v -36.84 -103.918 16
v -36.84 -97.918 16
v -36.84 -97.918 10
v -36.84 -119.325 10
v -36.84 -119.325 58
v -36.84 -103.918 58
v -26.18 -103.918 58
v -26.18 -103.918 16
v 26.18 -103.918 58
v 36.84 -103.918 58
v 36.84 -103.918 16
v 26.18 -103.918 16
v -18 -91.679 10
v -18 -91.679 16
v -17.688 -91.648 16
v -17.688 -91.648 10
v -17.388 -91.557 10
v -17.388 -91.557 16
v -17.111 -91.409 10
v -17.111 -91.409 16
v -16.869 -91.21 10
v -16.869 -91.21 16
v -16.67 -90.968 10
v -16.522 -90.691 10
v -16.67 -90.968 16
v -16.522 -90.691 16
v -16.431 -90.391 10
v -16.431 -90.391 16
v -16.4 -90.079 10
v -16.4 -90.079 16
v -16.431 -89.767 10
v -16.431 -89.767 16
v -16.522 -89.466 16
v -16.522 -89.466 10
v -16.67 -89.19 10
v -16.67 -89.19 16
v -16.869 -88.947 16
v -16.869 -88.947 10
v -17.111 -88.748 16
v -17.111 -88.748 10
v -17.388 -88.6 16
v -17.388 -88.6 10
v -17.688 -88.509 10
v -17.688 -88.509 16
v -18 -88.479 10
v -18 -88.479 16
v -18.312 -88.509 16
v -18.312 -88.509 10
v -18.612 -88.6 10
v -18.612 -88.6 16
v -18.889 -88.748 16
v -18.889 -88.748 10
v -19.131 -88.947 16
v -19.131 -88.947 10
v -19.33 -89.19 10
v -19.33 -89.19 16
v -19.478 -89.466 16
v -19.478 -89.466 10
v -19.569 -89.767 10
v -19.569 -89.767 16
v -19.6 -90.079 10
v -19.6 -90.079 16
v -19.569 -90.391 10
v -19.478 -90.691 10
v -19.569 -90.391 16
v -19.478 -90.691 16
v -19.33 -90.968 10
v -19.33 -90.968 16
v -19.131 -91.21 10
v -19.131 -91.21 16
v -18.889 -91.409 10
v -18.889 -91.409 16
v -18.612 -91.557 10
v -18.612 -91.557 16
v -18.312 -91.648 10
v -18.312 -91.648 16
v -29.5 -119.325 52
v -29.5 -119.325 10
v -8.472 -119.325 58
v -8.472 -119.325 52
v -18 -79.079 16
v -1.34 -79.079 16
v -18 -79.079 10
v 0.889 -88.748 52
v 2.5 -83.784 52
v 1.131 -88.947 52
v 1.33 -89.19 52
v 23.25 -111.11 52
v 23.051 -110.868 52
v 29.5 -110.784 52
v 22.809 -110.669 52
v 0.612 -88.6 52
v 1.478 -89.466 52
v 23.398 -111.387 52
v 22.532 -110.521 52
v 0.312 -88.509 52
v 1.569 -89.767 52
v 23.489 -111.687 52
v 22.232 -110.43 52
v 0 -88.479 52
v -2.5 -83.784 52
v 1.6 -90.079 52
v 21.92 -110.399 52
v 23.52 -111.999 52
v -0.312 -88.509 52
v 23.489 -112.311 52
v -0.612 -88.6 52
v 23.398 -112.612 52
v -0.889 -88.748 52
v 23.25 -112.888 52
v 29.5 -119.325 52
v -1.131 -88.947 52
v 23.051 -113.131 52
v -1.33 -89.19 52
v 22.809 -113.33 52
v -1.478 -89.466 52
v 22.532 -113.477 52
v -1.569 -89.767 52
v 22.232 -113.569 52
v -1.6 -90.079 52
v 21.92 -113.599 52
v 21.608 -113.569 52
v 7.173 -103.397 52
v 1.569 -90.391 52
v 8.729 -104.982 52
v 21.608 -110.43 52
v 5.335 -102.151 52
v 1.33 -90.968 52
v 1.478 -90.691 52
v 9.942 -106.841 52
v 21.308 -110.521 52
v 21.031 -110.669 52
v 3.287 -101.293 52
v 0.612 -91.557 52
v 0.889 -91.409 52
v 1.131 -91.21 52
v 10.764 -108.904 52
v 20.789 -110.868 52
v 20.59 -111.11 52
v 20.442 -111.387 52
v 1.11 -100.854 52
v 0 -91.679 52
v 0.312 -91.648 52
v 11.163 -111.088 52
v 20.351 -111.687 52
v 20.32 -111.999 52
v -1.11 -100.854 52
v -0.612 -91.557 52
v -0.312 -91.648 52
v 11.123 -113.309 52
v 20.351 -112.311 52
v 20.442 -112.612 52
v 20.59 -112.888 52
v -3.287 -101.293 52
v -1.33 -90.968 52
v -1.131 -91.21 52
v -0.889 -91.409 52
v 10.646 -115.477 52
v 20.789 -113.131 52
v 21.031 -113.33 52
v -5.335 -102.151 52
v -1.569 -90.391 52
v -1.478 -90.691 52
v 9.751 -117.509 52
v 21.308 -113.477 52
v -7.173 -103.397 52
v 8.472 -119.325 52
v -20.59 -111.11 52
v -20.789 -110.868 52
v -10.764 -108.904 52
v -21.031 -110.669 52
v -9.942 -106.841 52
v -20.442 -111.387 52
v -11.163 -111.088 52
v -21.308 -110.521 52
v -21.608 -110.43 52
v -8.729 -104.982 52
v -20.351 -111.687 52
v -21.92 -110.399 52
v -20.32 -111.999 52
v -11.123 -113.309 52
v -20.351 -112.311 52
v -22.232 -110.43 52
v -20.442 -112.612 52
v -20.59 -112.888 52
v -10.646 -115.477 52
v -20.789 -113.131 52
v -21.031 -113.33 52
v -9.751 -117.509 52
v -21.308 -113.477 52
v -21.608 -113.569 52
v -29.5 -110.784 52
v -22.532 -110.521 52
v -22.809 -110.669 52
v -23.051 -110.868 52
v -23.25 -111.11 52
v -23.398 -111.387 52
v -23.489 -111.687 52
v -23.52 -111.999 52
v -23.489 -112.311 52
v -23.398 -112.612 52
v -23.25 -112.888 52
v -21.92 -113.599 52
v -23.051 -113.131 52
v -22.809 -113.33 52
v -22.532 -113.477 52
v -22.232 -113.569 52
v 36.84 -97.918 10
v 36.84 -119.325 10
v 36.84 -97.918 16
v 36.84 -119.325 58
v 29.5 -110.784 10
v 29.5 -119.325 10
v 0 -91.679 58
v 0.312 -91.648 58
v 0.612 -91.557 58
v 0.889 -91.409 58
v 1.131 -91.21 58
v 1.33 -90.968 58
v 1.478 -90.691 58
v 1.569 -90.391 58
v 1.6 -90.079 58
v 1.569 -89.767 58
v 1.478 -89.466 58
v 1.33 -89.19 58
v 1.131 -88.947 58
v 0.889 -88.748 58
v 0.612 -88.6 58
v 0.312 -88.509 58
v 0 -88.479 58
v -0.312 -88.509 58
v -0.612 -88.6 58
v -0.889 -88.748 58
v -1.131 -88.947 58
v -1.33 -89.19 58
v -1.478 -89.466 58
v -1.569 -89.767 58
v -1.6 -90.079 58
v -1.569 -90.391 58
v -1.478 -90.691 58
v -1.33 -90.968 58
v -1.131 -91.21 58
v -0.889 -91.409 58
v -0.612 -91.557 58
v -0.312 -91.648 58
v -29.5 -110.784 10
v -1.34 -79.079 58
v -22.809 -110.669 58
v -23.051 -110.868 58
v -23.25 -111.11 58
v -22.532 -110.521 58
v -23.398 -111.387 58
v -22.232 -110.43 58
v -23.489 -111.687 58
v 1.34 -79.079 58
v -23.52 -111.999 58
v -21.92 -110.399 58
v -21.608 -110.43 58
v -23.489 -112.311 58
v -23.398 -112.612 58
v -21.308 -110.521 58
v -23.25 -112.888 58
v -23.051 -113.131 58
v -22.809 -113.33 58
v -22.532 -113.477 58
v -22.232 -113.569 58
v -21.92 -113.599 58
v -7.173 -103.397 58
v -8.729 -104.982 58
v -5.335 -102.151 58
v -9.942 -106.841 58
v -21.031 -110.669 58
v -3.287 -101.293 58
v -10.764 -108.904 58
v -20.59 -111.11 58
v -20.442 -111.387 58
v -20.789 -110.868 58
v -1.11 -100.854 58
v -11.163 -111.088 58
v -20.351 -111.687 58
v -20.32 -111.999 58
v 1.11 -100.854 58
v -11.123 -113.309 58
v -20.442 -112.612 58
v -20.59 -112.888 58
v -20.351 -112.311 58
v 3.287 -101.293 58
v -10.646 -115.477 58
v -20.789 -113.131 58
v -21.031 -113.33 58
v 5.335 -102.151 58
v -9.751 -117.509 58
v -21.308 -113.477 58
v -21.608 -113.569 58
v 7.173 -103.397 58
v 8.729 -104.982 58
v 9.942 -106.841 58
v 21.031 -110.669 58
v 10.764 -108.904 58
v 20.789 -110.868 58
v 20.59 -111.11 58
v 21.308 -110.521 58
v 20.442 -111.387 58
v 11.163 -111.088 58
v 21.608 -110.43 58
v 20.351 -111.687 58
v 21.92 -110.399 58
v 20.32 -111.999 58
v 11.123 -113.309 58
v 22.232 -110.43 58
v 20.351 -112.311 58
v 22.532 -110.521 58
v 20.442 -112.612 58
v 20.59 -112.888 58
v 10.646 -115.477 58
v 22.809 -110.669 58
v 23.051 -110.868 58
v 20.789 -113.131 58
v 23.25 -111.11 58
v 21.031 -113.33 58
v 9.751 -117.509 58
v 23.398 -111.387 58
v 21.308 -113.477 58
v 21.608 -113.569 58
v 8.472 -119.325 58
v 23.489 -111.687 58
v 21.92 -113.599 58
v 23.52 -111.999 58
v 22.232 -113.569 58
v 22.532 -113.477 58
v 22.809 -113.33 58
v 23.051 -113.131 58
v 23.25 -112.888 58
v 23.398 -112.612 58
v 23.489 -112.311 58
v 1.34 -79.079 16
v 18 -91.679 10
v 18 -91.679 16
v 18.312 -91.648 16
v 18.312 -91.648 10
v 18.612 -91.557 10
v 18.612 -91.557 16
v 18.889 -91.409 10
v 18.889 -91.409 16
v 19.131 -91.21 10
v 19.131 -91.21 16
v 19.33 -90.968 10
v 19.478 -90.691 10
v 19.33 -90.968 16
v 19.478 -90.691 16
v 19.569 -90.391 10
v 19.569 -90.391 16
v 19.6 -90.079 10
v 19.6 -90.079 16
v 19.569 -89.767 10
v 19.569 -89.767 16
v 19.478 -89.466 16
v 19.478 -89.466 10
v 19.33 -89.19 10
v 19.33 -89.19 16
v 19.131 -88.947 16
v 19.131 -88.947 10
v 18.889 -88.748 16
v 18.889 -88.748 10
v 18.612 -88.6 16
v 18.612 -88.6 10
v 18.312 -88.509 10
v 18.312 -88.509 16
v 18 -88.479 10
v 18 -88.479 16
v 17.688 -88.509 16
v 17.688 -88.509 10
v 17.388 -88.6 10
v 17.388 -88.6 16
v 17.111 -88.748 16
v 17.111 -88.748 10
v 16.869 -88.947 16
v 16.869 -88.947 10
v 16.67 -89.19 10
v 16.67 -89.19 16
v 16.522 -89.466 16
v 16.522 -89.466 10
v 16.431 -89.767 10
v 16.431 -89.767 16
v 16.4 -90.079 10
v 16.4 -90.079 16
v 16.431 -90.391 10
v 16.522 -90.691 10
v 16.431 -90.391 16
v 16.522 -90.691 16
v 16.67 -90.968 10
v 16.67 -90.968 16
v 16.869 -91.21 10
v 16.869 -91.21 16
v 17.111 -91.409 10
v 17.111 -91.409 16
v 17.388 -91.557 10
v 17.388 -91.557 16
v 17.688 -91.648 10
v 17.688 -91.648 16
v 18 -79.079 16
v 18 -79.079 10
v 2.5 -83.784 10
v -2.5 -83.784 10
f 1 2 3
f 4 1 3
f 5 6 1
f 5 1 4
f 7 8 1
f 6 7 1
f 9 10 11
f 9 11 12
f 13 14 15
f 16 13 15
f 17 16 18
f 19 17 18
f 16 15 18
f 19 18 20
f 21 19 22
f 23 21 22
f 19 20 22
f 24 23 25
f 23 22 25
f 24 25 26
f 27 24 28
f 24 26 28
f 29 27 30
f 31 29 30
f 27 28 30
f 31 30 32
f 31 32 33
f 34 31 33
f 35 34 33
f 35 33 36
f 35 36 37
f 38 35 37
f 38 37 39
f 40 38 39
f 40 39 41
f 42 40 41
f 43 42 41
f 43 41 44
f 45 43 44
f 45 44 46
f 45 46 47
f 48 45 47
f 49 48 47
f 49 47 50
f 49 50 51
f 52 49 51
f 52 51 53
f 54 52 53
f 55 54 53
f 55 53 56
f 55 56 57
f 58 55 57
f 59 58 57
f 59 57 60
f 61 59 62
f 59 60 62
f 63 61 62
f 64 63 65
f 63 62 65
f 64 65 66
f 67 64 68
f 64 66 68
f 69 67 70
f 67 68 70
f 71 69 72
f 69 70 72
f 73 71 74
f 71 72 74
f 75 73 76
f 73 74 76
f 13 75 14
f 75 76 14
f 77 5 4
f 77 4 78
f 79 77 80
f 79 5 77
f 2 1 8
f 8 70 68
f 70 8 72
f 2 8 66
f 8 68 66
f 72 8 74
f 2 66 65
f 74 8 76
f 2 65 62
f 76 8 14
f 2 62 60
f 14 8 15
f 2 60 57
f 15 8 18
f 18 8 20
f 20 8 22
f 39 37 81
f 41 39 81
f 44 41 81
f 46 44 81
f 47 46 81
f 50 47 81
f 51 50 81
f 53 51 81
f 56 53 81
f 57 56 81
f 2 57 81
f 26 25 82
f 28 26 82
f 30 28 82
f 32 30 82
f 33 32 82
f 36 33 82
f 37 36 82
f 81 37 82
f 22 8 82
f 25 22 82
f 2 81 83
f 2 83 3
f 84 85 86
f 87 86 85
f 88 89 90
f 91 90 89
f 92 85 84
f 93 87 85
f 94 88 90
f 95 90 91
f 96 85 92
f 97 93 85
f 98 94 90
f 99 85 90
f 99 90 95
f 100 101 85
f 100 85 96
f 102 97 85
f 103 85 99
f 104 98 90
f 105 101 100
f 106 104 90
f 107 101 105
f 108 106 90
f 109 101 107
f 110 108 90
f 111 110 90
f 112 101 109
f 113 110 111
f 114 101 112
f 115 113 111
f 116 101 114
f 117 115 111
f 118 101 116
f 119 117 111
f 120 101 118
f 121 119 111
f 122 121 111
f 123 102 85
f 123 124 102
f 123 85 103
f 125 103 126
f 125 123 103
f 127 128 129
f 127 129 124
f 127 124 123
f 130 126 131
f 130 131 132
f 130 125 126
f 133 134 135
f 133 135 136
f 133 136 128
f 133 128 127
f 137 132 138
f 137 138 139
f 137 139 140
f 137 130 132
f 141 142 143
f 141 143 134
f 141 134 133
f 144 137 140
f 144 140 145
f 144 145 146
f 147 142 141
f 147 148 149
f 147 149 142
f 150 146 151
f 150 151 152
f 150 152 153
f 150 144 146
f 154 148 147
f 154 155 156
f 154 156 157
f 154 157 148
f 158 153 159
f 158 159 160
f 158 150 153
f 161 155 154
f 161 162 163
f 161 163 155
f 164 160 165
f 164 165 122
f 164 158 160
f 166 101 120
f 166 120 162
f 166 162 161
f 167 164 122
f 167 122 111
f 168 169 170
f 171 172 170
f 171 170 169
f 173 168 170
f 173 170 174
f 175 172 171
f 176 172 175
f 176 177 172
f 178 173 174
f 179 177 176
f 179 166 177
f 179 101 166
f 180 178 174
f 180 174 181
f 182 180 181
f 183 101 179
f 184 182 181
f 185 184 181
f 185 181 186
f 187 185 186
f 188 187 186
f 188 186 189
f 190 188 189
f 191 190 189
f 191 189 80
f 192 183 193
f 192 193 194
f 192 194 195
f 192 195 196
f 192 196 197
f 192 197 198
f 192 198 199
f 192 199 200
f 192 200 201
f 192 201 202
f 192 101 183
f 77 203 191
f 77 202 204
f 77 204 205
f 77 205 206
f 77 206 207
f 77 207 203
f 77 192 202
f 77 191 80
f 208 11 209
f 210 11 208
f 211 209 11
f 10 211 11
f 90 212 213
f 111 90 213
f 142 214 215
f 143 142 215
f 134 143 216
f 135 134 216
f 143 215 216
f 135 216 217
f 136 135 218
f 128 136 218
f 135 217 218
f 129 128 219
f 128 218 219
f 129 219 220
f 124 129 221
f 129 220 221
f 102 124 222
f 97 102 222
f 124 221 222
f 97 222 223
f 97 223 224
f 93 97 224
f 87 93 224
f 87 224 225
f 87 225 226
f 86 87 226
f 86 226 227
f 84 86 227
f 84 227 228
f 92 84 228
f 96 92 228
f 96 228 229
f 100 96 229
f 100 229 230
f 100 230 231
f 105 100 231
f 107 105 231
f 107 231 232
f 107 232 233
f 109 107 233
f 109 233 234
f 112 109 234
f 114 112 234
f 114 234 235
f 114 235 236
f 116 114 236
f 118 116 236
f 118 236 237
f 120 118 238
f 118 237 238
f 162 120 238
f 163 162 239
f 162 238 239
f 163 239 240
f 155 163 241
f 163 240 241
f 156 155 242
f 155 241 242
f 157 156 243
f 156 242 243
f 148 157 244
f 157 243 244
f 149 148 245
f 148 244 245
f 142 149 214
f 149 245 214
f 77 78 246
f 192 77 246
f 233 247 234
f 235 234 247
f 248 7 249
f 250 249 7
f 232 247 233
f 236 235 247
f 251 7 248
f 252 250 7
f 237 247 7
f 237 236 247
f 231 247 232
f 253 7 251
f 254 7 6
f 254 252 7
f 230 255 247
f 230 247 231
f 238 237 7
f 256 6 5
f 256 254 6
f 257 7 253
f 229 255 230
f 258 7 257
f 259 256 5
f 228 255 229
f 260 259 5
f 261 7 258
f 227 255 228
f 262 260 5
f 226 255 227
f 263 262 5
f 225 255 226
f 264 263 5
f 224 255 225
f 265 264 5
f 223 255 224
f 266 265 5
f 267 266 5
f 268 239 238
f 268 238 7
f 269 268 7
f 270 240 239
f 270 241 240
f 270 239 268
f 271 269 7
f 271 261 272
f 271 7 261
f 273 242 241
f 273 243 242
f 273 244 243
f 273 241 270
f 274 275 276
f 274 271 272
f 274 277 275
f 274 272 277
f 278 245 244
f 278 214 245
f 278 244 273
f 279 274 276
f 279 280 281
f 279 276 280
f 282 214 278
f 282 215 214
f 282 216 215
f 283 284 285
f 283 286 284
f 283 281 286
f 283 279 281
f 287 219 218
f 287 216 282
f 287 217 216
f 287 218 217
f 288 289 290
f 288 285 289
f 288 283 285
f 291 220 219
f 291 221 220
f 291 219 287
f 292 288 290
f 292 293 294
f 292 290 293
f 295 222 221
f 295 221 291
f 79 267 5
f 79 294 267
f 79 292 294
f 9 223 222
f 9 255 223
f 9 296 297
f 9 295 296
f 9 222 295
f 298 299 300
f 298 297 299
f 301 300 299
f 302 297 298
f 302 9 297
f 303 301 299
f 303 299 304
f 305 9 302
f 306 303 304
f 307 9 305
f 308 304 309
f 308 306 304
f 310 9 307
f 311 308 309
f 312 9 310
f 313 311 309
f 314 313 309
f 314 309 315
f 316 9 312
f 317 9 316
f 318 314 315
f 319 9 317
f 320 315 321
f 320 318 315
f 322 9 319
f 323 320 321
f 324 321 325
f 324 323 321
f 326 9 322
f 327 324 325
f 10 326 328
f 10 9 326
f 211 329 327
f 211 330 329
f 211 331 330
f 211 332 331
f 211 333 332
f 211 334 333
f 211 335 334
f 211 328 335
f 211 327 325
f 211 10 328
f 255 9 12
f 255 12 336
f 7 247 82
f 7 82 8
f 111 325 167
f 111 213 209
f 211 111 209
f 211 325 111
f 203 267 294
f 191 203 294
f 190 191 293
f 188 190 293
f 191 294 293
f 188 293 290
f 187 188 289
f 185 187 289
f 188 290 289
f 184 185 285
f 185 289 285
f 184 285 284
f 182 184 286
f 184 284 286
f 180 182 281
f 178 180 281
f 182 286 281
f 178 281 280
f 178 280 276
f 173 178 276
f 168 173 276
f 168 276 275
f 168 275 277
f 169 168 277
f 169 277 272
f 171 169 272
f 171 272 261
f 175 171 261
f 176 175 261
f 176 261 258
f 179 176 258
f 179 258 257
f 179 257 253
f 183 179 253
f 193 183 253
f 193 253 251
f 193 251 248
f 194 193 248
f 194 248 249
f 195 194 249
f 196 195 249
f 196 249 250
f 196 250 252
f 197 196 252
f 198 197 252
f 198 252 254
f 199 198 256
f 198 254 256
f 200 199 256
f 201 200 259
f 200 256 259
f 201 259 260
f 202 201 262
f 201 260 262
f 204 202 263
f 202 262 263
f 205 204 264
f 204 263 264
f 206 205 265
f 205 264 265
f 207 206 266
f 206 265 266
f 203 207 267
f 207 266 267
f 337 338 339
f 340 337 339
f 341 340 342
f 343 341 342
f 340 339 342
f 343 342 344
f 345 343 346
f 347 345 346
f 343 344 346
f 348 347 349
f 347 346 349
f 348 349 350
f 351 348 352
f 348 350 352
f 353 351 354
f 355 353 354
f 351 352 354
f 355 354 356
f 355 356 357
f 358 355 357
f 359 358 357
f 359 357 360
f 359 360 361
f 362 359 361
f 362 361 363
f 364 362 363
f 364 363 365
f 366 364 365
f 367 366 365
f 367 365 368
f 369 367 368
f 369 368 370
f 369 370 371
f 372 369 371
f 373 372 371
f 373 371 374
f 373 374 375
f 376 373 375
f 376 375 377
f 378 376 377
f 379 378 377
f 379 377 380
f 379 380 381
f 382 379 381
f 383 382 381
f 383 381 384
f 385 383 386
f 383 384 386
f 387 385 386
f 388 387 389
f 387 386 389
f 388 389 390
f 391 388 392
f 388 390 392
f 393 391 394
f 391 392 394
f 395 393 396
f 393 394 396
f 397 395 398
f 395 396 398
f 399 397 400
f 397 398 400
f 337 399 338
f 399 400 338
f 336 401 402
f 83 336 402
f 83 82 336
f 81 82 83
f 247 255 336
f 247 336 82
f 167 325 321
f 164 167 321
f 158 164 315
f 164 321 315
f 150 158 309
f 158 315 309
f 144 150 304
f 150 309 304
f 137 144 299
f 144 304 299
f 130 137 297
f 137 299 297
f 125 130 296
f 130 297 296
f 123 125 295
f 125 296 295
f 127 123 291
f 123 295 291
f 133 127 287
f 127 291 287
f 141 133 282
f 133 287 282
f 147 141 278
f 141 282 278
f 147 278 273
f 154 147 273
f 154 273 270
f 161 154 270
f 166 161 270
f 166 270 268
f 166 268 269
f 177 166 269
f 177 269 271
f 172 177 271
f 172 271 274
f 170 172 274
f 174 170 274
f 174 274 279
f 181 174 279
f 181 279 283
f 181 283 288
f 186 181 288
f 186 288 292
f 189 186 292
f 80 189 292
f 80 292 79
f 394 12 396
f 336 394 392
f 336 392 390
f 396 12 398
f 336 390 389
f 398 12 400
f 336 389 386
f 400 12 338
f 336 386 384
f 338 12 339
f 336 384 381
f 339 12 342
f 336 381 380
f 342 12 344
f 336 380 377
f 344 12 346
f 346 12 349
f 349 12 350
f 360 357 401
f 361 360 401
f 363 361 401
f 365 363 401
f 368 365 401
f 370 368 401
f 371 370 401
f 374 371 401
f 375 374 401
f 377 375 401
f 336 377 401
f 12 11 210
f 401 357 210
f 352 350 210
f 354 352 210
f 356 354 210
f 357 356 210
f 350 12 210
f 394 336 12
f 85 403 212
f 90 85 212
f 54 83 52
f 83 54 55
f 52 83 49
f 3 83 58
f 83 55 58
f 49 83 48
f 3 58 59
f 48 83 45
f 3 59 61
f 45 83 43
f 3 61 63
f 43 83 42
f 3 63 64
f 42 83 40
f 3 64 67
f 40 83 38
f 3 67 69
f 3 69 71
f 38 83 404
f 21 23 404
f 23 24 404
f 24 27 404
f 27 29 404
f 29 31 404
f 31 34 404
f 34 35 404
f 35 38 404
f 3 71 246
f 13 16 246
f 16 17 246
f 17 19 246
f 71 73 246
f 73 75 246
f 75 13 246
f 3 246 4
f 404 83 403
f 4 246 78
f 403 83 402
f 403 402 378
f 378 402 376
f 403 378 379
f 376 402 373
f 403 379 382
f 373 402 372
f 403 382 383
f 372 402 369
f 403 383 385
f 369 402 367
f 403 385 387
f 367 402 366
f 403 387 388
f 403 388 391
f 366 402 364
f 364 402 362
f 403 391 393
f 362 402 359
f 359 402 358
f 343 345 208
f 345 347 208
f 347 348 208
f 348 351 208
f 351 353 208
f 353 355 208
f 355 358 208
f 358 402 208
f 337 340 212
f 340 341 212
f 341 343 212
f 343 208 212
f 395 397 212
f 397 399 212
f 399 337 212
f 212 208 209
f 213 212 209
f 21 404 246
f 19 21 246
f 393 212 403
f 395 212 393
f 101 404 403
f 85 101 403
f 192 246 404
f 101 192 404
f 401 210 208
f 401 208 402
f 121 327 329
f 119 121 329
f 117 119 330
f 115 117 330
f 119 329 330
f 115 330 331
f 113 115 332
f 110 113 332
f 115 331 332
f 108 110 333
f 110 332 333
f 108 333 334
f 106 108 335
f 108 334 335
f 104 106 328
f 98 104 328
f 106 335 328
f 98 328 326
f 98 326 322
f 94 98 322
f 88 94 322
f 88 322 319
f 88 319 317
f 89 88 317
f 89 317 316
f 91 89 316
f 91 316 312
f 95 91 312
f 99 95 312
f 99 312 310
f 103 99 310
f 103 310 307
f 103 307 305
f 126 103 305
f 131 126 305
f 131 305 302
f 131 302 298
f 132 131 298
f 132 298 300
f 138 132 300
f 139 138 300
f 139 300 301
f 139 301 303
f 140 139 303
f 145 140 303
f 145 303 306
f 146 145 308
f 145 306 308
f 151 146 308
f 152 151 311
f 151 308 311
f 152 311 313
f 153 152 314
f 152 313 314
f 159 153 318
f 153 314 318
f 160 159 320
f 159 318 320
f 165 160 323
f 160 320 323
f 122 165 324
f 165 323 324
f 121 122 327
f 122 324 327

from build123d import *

# Parameters (mm, degrees)
SKETCH081_R             = 1.6
SKETCH081_R_2           = 11.2
PAD028_DEPTH            = 48
POCKET048_DEPTH         = 42
POCKET049_DEPTH         = 42
SKETCH084_W             = 10.029114
SKETCH084_H             = 77.862412
POCKET050_DEPTH         = 48
BODY018_PLACEMENT_ANGLE = 90


with BuildPart() as part:
    # Sketch081 → Pad028 (new body)
    with BuildSketch(Plane.XY):
        Polygon((133.0786530333, 18), (133.0786530333, -18), (151.9182582148, -36.8396051816), (177.784363, -36.8396051816), (177.784363, 36.8396051816), (151.9182582148, 36.8396051816), align=None)
        with Locations((144.0786530333, 0)):
            Circle(SKETCH081_R, mode=Mode.SUBTRACT)
        with Locations((165.9992734624, 21.92)):
            Circle(SKETCH081_R, mode=Mode.SUBTRACT)
        with Locations((165.9992734624, -21.92)):
            Circle(SKETCH081_R, mode=Mode.SUBTRACT)
        with Locations((165.9992734624, 0)):
            Circle(SKETCH081_R_2, mode=Mode.SUBTRACT)
        with Locations((144.0786530333, 18)):
            Circle(SKETCH081_R, mode=Mode.SUBTRACT)
        with Locations((144.0786530333, -18)):
            Circle(SKETCH081_R, mode=Mode.SUBTRACT)
    extrude(amount=-PAD028_DEPTH)

    # Sketch082 (on Face14 of Pad028) → Pocket048 (cut)
    with BuildSketch(Plane(origin=(0, 0, -48), x_dir=(1, 0, 0), z_dir=(0, 0, -1))):
        Polygon((177.784363, 29.5), (164.784363, 29.5), (137.784363, 2.5), (137.784363, -2.5), (164.784363, -29.5), (177.784363, -29.5), align=None)
    extrude(amount=-POCKET048_DEPTH, mode=Mode.SUBTRACT)

    # Sketch083 (on Face4 of Pocket048) → Pocket049 (cut)
    with BuildSketch(Plane.XY):
        Polygon((157.9182582148, 26.18), (131.7382582148, 0), (157.9182582148, -26.18), (157.9182582148, -40), (107.9182582148, -40), (107.9182582148, 40), (157.9182582148, 40), align=None)
    extrude(amount=-POCKET049_DEPTH, mode=Mode.SUBTRACT)

    # Sketch084 (on Face4 of Pocket049) → Pocket050 (cut)
    with BuildSketch(Plane.XY):
        with Locations((178.339218, -0.178093)):
            Rectangle(SKETCH084_W, SKETCH084_H)
    extrude(amount=-POCKET050_DEPTH, mode=Mode.SUBTRACT)


with BuildPart() as part_1:
    # Body018 placement: moved
    add(part.part.moved(Location((0, 54, 58))).rotate(Axis((0, 54, 58), (0, 0, -1)), BODY018_PLACEMENT_ANGLE))


solid = part_1.part
